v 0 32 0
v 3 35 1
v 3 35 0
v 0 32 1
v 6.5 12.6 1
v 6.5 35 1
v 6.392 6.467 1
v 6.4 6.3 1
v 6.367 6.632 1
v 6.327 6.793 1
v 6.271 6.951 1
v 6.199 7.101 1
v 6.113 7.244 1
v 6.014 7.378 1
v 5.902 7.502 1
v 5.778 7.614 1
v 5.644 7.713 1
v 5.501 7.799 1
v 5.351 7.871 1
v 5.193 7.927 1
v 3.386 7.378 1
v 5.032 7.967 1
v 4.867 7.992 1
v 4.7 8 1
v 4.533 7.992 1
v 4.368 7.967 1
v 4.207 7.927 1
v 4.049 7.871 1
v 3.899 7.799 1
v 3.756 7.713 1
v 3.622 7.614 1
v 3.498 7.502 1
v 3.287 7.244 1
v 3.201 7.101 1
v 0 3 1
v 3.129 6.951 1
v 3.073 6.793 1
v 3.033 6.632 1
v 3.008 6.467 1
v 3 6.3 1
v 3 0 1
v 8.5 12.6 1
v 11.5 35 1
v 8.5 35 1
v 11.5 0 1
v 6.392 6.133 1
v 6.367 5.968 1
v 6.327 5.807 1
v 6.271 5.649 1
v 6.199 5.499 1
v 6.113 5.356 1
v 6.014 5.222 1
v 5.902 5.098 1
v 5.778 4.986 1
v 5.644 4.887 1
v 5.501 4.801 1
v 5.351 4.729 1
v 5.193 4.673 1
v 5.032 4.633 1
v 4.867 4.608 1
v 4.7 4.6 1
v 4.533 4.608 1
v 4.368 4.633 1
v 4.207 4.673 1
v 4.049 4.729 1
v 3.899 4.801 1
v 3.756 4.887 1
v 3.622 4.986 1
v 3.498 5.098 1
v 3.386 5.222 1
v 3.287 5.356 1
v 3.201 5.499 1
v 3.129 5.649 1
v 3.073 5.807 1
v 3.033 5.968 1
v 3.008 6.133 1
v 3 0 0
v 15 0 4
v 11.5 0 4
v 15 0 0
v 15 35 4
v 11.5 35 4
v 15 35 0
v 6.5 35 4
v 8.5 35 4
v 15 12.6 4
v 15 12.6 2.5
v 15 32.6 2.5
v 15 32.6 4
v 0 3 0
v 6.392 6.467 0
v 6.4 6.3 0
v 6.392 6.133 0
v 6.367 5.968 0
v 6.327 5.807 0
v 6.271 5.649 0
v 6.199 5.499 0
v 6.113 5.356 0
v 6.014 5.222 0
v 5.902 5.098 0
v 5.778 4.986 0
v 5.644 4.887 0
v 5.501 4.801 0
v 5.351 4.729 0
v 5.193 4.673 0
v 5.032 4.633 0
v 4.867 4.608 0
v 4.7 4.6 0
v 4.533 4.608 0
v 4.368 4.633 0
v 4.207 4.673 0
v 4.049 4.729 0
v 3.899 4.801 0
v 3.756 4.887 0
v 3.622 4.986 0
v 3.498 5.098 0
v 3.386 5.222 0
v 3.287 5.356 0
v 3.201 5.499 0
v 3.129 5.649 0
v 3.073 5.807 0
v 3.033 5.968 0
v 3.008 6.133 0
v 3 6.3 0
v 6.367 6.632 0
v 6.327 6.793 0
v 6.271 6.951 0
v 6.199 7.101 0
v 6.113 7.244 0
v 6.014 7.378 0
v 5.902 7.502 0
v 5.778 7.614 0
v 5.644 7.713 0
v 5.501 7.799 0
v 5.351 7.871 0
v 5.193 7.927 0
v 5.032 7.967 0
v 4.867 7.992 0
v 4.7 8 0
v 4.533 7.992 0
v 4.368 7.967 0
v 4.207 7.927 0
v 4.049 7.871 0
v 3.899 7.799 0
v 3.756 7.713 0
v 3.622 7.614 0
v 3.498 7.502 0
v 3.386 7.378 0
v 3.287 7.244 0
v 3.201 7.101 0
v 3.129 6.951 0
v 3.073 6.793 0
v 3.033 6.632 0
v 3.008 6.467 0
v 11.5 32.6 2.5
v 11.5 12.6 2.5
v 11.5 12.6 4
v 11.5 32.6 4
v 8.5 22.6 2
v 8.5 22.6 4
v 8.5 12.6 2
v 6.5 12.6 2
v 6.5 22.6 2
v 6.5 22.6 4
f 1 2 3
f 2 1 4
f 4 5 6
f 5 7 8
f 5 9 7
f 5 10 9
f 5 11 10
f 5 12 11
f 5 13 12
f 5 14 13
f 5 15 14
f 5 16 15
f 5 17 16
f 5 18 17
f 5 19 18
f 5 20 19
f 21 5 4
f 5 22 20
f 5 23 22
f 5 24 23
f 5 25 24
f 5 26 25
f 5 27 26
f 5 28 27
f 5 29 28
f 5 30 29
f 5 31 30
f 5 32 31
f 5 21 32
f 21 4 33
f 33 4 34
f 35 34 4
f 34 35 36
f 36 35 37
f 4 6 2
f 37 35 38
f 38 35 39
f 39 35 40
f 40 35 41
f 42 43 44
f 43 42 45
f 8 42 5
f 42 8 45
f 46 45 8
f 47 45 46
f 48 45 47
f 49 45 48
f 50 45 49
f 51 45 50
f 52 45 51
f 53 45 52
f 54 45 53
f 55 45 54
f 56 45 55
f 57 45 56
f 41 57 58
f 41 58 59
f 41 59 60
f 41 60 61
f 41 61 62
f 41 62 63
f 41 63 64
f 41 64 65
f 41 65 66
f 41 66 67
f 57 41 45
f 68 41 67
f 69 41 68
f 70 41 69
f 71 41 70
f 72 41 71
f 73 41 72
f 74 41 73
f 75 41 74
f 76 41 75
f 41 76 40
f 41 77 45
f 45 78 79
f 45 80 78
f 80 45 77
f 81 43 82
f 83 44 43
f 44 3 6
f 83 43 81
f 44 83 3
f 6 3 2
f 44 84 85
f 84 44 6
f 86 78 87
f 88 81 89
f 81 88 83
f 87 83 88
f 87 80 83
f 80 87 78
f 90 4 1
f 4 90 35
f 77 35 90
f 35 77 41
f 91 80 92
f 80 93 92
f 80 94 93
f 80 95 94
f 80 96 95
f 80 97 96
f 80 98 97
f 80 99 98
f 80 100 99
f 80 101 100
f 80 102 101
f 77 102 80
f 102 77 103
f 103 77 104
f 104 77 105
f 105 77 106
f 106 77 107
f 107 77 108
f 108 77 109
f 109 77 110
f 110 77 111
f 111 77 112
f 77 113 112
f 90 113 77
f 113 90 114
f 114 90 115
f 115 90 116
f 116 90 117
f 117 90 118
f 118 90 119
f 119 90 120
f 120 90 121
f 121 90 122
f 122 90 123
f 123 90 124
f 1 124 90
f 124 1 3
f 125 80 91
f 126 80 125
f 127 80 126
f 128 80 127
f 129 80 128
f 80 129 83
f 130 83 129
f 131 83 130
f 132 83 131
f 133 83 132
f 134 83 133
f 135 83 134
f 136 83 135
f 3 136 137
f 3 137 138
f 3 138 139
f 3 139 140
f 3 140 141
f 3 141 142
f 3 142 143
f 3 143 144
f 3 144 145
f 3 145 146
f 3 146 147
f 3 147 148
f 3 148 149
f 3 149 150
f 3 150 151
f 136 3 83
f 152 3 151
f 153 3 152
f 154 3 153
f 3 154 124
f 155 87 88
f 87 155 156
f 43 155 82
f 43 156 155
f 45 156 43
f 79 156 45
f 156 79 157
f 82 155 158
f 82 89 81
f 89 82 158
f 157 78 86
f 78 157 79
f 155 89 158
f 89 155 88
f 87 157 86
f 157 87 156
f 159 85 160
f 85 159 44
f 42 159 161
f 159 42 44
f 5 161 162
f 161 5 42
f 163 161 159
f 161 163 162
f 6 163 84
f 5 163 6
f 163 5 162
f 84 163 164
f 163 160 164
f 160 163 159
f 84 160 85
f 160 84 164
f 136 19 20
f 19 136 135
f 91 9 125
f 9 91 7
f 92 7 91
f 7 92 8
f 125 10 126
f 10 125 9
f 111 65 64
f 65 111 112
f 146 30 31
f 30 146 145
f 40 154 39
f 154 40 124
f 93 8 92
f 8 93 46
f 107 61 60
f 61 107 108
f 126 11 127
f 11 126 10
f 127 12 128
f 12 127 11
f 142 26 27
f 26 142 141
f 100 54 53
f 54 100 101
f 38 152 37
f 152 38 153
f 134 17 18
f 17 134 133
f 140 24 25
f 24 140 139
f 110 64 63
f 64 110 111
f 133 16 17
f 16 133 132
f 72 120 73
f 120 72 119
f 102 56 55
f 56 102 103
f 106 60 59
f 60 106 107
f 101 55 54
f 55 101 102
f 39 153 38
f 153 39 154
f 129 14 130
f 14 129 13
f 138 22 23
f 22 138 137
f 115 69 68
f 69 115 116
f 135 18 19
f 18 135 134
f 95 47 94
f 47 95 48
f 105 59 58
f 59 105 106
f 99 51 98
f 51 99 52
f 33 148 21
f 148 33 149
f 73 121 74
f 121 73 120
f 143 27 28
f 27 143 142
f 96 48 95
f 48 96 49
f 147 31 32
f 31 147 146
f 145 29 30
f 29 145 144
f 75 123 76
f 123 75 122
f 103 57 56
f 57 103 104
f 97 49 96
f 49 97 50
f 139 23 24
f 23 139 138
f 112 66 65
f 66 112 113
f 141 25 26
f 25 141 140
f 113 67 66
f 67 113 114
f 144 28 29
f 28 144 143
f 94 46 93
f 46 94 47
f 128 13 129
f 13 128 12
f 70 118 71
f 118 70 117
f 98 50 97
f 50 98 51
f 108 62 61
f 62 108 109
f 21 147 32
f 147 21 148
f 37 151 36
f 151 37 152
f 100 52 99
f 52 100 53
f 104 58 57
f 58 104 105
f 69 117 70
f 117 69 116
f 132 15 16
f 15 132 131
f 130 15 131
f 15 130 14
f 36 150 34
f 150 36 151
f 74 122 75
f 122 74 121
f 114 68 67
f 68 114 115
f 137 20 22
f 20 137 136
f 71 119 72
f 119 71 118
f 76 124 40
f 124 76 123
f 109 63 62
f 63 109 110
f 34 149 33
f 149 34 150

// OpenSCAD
difference() {
	union() {
		linear_extrude(height = 1)
			polygon(
				points=[ [0,3],[3,0],[15,0],[15,35],[3,35],[0,32] ],
				paths=[[0,1,2,3,4,5]]
			);

		linear_extrude(height = 2.5)
			polygon(
				points=[ [11.5,0],[15,0],[15,35],[11.5,35] ],
				paths=[[0,1,2,3]]
			);

		linear_extrude(height = 4)
			polygon(
				points=[
					[11.5,0],[15,0],[15,12.6],[11.5,12.6],
					[11.5,32.6],[15,32.6],[15,35],[11.5,35]
					],
				paths=[[0,1,2,3], [4,5,6,7]]
			);

		linear_extrude(height = 2)
			polygon(
				points=[
					[6.5,12.6],[8.5,12.6],[8.5,35],[6.5,35]
					],
				paths=[[0,1,2,3]]
			);

		linear_extrude(height = 4)
			polygon(
				points=[
					[6.5,22.6],[8.5,22.6],[8.5,35],[6.5,35]
					],
				paths=[[0,1,2,3]]
			);
	}

	translate([4.7, 6.3, -1])
		cylinder(h = 3, r=1.7, $fn=64);
}
